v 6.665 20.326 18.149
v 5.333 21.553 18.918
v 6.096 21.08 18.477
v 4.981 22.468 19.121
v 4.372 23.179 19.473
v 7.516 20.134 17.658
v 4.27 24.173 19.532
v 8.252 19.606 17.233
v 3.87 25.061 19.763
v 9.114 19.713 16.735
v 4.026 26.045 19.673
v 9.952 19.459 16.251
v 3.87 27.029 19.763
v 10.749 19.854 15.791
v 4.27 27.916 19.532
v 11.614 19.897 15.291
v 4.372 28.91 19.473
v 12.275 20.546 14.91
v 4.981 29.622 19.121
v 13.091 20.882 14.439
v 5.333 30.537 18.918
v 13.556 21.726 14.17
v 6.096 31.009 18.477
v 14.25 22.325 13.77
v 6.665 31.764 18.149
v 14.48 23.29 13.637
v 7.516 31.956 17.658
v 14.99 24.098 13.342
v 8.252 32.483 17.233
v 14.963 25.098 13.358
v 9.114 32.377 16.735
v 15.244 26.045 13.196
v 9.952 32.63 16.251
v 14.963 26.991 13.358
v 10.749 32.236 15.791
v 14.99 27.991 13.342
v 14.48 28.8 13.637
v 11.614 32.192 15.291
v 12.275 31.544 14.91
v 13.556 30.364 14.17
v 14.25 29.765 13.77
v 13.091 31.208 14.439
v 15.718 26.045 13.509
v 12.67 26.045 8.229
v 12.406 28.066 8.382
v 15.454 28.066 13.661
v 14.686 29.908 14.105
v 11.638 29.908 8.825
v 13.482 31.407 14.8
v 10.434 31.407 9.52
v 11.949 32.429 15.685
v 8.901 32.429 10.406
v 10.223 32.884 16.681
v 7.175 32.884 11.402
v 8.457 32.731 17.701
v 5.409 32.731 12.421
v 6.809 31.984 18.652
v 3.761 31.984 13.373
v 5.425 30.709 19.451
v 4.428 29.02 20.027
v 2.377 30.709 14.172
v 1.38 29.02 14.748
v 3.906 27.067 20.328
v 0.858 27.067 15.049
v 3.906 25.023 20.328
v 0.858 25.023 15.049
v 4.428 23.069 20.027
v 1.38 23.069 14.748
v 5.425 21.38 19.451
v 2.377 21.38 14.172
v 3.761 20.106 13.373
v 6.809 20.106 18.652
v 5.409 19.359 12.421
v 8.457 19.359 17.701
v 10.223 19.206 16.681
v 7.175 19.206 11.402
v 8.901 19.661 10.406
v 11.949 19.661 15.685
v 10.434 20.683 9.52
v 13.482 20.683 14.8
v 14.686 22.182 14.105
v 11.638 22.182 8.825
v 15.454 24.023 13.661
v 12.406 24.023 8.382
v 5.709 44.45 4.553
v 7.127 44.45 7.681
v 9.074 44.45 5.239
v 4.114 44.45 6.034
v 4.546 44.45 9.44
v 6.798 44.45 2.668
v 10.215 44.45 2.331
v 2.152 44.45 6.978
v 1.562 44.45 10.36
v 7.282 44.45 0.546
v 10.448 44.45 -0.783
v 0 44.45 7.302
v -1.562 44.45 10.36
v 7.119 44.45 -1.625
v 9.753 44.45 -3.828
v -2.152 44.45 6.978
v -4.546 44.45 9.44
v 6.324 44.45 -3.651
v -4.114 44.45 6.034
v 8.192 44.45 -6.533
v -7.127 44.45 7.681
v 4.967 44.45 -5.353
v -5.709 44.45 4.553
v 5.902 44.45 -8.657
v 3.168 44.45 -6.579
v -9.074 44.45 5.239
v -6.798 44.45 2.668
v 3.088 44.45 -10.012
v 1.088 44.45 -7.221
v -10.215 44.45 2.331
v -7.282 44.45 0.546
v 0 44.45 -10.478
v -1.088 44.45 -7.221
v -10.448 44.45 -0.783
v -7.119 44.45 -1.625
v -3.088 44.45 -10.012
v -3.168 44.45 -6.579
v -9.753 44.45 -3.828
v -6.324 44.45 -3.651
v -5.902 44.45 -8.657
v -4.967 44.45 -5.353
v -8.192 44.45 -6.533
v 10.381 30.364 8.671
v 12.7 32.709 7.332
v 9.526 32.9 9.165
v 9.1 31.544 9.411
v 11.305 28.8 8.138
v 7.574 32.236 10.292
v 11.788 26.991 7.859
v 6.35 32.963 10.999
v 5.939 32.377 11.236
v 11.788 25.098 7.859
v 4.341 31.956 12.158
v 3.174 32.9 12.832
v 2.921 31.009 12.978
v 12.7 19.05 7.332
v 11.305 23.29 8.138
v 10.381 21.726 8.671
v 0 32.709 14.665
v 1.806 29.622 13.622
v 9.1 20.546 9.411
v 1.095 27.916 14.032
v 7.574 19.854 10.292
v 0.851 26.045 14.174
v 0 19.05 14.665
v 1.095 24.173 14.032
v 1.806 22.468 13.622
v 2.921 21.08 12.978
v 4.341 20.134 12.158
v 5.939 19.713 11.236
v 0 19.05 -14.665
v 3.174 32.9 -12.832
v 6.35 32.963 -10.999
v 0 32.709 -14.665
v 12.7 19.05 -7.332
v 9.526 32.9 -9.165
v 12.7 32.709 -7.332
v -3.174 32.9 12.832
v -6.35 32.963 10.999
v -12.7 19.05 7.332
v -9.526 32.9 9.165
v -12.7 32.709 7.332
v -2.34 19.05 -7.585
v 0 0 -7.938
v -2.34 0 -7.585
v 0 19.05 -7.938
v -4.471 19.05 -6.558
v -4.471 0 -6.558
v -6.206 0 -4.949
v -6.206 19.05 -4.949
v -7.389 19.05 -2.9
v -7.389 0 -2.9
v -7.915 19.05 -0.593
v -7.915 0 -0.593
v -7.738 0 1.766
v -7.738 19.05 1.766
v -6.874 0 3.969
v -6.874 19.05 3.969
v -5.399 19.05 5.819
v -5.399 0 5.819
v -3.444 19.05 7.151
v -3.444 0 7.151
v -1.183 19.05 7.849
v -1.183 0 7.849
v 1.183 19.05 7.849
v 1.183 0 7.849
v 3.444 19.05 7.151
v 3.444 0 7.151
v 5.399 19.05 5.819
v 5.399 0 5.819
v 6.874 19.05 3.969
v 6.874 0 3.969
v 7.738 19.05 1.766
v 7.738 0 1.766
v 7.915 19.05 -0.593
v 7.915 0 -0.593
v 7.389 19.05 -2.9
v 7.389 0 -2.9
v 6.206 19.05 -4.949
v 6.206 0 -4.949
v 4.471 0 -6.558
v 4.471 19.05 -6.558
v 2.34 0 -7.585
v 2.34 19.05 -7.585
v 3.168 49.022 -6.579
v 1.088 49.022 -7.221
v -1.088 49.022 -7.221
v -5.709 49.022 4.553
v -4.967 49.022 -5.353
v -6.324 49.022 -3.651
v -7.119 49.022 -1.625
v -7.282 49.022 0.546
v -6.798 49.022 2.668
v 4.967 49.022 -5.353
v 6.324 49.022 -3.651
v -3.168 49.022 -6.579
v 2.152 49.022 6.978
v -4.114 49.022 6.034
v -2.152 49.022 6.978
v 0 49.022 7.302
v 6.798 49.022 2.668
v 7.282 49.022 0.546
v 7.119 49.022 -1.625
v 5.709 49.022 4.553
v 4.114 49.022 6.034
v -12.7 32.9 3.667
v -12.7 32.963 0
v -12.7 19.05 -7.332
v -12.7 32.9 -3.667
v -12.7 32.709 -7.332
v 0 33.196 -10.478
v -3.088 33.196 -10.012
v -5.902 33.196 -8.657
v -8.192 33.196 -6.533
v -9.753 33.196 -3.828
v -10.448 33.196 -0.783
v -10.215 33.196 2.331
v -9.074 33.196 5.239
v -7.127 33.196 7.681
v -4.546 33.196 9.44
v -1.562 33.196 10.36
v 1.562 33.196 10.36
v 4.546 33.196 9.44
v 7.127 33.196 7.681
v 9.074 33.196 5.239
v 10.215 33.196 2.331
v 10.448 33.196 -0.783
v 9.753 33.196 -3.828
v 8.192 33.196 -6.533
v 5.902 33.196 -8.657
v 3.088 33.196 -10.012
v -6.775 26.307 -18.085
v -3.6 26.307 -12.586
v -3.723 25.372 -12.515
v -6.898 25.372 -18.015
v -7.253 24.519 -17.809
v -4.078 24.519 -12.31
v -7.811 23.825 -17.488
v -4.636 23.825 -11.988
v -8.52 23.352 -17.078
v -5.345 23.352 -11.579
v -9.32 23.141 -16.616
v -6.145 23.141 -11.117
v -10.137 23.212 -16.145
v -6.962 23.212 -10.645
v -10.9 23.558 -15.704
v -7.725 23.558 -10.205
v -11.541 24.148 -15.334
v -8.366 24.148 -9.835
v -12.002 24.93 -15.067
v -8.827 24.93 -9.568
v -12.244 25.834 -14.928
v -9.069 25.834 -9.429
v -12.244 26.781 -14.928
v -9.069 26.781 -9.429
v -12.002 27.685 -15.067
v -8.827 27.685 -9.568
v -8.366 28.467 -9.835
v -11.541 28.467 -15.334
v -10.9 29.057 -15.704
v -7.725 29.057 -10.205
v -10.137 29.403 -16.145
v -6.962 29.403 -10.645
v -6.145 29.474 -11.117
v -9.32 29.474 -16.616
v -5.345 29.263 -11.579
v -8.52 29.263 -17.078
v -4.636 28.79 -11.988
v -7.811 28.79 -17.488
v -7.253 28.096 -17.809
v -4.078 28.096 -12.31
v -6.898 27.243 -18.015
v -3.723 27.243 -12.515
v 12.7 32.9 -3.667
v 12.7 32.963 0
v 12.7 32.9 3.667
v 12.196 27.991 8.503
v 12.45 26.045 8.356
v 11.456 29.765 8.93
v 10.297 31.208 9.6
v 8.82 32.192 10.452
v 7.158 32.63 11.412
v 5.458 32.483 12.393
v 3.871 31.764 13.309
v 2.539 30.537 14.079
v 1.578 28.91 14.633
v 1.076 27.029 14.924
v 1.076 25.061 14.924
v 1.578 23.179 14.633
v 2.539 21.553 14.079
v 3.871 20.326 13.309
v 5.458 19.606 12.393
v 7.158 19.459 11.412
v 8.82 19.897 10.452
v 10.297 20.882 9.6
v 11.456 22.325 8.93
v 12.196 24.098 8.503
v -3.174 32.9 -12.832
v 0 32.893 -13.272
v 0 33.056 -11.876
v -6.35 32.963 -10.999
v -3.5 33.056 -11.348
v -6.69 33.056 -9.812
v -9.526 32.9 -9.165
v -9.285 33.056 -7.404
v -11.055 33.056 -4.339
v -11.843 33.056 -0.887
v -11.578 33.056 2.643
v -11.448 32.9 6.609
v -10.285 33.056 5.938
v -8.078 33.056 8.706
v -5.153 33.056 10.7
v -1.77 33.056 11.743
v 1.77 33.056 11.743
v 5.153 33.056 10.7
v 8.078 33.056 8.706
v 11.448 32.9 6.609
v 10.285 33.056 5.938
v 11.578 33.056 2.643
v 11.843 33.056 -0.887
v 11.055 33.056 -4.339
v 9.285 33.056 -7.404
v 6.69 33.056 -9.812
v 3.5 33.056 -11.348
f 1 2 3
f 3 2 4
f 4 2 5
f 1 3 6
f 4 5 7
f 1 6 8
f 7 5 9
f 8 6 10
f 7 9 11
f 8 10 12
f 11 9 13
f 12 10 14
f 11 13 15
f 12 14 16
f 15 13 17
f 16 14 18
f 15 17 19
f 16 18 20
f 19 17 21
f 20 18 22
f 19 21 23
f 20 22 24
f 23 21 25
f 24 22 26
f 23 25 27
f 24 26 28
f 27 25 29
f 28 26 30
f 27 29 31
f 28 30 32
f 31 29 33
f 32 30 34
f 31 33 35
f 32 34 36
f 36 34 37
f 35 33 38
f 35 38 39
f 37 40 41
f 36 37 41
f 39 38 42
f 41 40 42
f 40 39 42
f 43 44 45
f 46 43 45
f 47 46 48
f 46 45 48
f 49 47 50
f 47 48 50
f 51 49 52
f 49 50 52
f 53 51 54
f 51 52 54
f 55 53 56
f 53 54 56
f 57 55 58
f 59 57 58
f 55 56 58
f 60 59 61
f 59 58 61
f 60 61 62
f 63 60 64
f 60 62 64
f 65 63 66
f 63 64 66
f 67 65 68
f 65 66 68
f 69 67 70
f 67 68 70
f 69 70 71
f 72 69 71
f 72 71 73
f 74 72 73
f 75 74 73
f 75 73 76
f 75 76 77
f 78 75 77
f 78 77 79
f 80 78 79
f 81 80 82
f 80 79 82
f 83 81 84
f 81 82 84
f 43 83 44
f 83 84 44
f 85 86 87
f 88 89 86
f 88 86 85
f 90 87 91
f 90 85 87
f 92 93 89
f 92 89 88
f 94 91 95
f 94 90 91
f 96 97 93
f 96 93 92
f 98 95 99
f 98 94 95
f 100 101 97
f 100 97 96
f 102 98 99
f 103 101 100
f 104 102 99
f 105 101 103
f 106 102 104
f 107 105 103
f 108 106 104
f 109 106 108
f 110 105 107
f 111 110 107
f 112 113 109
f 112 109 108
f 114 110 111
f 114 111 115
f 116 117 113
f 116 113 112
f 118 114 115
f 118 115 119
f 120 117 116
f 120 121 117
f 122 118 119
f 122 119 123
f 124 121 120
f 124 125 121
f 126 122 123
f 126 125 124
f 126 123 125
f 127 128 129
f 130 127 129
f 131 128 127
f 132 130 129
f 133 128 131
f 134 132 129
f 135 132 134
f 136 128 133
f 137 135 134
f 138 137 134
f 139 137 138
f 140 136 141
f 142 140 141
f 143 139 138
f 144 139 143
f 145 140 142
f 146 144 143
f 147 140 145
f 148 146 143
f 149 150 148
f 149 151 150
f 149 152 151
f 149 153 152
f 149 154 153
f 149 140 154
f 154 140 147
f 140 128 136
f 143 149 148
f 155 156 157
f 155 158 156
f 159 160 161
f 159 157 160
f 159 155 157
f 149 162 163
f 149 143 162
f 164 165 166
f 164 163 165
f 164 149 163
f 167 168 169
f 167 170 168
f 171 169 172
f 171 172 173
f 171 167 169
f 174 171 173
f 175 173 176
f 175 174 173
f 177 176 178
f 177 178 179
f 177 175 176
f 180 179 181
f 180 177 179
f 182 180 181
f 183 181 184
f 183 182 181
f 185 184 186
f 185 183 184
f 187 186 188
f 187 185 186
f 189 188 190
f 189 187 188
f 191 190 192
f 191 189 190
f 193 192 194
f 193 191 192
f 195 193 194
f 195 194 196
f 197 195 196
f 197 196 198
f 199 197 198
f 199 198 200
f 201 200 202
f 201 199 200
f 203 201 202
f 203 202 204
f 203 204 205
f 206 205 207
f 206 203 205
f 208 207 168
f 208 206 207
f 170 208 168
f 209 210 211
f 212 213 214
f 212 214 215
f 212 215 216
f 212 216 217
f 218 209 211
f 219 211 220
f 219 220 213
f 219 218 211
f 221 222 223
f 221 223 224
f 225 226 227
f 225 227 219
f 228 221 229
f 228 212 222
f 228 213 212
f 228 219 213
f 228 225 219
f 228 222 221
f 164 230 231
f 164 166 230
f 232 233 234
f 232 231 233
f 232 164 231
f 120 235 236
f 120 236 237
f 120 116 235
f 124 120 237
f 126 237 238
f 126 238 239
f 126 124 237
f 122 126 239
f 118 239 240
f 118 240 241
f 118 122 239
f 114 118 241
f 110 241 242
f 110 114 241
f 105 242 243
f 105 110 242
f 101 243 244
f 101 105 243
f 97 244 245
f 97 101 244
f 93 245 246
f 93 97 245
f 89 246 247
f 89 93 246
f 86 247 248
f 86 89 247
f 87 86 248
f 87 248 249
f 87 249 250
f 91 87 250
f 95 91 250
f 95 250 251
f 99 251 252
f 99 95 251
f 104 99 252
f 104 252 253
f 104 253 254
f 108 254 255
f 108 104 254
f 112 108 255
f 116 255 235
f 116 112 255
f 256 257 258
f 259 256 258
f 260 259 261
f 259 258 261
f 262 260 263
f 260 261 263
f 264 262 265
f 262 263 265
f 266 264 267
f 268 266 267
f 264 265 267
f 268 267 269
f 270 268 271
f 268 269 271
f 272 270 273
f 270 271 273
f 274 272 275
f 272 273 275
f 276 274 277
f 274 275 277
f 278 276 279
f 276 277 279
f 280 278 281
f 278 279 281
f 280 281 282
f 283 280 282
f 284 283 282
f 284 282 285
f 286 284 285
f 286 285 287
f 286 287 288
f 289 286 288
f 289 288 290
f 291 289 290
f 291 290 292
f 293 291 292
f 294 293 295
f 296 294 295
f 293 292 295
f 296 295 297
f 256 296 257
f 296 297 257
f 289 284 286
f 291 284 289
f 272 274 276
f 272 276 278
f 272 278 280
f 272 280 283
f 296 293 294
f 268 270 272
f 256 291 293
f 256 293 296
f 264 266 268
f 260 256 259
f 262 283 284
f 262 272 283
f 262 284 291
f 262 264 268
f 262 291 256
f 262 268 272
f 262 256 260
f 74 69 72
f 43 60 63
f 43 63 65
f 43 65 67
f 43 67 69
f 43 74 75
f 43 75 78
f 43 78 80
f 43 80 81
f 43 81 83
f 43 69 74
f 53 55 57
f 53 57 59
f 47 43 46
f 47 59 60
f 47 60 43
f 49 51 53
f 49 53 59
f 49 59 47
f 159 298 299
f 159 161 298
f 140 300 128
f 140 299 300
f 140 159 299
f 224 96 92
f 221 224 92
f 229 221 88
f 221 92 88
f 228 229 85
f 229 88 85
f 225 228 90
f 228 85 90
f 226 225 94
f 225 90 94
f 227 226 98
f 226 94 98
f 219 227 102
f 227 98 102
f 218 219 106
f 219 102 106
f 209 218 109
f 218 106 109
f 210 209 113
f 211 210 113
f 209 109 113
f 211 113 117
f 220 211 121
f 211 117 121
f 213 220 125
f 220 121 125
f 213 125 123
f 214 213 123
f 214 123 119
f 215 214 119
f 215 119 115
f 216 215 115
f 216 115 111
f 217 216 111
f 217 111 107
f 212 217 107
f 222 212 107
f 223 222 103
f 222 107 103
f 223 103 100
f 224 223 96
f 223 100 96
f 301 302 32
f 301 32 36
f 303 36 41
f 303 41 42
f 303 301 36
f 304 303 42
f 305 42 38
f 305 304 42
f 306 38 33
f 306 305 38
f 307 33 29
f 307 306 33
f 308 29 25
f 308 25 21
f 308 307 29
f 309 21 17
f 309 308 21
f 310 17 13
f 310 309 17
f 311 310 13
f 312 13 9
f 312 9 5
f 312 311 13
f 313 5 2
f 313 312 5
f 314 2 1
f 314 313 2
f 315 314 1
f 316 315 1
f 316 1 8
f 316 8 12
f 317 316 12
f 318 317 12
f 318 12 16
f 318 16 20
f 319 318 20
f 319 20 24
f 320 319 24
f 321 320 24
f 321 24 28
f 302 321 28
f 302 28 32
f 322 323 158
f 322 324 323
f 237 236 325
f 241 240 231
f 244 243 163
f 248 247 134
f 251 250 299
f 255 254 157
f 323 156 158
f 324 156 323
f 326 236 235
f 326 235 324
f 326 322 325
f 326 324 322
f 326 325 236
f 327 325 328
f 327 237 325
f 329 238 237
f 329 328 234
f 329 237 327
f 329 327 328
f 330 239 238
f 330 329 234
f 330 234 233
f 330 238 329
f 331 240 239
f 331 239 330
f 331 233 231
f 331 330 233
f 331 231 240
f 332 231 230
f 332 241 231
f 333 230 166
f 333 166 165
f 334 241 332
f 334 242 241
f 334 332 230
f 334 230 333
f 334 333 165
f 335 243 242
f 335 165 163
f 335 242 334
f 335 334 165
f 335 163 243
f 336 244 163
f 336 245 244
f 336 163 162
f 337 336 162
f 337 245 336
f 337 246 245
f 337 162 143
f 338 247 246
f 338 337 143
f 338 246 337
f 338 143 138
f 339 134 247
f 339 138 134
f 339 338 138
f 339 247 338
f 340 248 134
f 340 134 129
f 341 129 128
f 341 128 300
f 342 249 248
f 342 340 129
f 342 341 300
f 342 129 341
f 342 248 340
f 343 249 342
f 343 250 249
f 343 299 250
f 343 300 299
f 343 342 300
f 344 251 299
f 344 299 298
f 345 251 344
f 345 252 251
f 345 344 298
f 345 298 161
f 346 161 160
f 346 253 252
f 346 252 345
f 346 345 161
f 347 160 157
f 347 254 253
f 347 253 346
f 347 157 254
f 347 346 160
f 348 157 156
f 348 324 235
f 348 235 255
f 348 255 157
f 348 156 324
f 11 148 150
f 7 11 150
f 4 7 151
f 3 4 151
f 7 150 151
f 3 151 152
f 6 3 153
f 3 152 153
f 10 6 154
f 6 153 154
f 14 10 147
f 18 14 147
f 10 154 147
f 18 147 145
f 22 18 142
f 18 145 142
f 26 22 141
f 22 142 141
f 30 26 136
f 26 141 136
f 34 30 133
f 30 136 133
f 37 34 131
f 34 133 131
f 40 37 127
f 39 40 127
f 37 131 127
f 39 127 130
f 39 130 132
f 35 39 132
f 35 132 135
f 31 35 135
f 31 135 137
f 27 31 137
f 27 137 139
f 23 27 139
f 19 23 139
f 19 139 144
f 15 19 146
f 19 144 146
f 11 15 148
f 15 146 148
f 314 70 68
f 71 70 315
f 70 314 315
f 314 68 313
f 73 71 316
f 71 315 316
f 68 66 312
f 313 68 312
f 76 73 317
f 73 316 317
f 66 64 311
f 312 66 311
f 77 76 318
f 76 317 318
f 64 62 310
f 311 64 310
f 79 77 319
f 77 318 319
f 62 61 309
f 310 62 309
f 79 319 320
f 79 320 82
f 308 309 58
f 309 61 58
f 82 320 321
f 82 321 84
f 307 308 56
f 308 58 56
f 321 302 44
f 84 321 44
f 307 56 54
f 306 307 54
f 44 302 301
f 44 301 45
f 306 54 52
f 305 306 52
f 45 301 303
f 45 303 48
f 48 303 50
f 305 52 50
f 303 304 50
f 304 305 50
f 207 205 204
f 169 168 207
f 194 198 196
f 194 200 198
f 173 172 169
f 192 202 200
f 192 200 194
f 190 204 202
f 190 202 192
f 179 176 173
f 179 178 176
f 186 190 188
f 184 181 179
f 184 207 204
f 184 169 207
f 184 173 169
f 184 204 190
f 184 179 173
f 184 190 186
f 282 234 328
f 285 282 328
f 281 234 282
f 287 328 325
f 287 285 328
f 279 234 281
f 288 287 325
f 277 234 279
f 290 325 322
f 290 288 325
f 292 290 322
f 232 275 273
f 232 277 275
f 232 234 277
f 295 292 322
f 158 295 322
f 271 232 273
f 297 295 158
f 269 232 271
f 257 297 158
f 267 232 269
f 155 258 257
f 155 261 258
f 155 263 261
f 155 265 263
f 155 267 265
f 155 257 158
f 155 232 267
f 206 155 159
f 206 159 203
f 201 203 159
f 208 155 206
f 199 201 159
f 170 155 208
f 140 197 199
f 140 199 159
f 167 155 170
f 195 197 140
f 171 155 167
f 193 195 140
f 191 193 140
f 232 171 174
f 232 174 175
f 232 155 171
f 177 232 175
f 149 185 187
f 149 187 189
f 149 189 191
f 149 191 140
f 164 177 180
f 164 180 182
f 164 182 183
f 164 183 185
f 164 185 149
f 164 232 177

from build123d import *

# Parameters (mm, degrees)
SKETCH2_R                = 31.284897101
CUT_EXTRUDE2_DEPTH       = 58.150000089
SKETCH3_R                = 3.175
BOSS_EXTRUDE1_DEPTH      = 6.35
SKETCH4_R                = 6.35
BOSS_EXTRUDE3_DEPTH      = 6.35
BOSS_EXTRUDE4_DEPTH      = 0.508
BOSS_EXTRUDE4_DEPTH_BACK = 5.588
SKETCH5_R                = 6.858
SKETCH5_R_2              = 6.604
SKETCH5_3_R              = 6.604
BOSS_EXTRUDE5_DEPTH      = 0.508
SKETCH6_R                = 7.3025
BOSS_EXTRUDE6_DEPTH      = 4.572


with BuildPart() as part:
    # Sketch1 → Revolve1 (revolve)
    with BuildSketch(Plane(origin=(0, 0, 0), x_dir=(0, 0, -1), z_dir=(1, 0, 0))):
        with BuildLine():
            Line((10.4775, 33.195692203), (10.4775, 44.45))
            Line((10.4775, 44.45), (0, 44.45))
            Line((0, 44.45), (0, 0))
            Line((0, 0), (7.9375, 0))
            Line((7.9375, 0), (7.9375, 19.05))
            Line((7.9375, 19.05), (25.4, 19.05))
            Line((25.4, 19.05), (25.4, 30.511567858))
            ThreePointArc((25.4, 30.511567858), (17.996597132, 32.175233549), (10.4775, 33.195692203))
        make_face()
    revolve(axis=Axis((0, 0, 0), (0, 1, 0)))

    # Sketch2 → Cut-Extrude2 (cut, through all)
    with BuildSketch(Plane(origin=(0, 0, 0), x_dir=(1, 0, 0), z_dir=(0, 1, 0))):
        Circle(SKETCH2_R)
        Polygon((-12.7, 7.332348419), (0, 14.664696837), (12.7, 7.332348419), (12.7, -7.332348419), (0, -14.664696837), (-12.7, -7.332348419), align=None, mode=Mode.SUBTRACT)
    extrude(amount=CUT_EXTRUDE2_DEPTH, mode=Mode.SUBTRACT)

    # Sketch3 → Boss-Extrude1 (add)
    with BuildSketch(Plane(origin=(-6.35, 0, -10.998522628), x_dir=(-0.8660254037844386, 0, 0.5000000000000002), z_dir=(-0.5000000000000001, 0, -0.8660254037844385))):
        with Locations((0, 26.307433584)):
            Circle(SKETCH3_R)
    extrude(amount=BOSS_EXTRUDE1_DEPTH)

    # Sketch4 → Boss-Extrude3 (add)
    with BuildSketch(Plane(origin=(6.35, 0, 10.998522628), x_dir=(0.8660254037844406, 0, -0.49999999999999684), z_dir=(0.49999999999999684, 0, 0.8660254037844406))):
        with Locations((0, 26.044781418)):
            Circle(SKETCH4_R)
    extrude(amount=BOSS_EXTRUDE3_DEPTH)



with BuildPart() as body_2:
    # Sketch5 → Boss-Extrude4 (new, two sides: drawn at the far end of the back side and taken through both)
    with BuildSketch(Plane(origin=(9.525, 0, 16.497783942), x_dir=(0.8660254037844405, 0, -0.49999999999999695), z_dir=(0.4999999999999969, 0, 0.8660254037844404)).offset(-BOSS_EXTRUDE4_DEPTH_BACK)):
        with Locations((0, 26.044781418)):
            Circle(SKETCH5_R)
        with Locations((0, 26.044781418)):
            Circle(SKETCH5_R_2, mode=Mode.SUBTRACT)
    extrude(amount=BOSS_EXTRUDE4_DEPTH + BOSS_EXTRUDE4_DEPTH_BACK)


with BuildPart() as part_1:
    add(part.part)

    add(body_2.part)  # Boss-Extrude5 merges body 2
    # Sketch5<3> → Boss-Extrude5 (add)
    with BuildSketch(Plane(origin=(9.525, 0, 16.497783942), x_dir=(0.8660254037844405, 0, -0.49999999999999695), z_dir=(0.4999999999999969, 0, 0.8660254037844404))):
        with Locations((0, 26.044781418)):
            Circle(SKETCH5_3_R)
    extrude(amount=BOSS_EXTRUDE5_DEPTH)

    # Sketch6 → Boss-Extrude6 (add)
    with BuildSketch(Plane(origin=(0, 44.45, 0), x_dir=(1, 0, 0), z_dir=(0, 1, 0))):
        Circle(SKETCH6_R)
    extrude(amount=BOSS_EXTRUDE6_DEPTH)


solid = part_1.part
